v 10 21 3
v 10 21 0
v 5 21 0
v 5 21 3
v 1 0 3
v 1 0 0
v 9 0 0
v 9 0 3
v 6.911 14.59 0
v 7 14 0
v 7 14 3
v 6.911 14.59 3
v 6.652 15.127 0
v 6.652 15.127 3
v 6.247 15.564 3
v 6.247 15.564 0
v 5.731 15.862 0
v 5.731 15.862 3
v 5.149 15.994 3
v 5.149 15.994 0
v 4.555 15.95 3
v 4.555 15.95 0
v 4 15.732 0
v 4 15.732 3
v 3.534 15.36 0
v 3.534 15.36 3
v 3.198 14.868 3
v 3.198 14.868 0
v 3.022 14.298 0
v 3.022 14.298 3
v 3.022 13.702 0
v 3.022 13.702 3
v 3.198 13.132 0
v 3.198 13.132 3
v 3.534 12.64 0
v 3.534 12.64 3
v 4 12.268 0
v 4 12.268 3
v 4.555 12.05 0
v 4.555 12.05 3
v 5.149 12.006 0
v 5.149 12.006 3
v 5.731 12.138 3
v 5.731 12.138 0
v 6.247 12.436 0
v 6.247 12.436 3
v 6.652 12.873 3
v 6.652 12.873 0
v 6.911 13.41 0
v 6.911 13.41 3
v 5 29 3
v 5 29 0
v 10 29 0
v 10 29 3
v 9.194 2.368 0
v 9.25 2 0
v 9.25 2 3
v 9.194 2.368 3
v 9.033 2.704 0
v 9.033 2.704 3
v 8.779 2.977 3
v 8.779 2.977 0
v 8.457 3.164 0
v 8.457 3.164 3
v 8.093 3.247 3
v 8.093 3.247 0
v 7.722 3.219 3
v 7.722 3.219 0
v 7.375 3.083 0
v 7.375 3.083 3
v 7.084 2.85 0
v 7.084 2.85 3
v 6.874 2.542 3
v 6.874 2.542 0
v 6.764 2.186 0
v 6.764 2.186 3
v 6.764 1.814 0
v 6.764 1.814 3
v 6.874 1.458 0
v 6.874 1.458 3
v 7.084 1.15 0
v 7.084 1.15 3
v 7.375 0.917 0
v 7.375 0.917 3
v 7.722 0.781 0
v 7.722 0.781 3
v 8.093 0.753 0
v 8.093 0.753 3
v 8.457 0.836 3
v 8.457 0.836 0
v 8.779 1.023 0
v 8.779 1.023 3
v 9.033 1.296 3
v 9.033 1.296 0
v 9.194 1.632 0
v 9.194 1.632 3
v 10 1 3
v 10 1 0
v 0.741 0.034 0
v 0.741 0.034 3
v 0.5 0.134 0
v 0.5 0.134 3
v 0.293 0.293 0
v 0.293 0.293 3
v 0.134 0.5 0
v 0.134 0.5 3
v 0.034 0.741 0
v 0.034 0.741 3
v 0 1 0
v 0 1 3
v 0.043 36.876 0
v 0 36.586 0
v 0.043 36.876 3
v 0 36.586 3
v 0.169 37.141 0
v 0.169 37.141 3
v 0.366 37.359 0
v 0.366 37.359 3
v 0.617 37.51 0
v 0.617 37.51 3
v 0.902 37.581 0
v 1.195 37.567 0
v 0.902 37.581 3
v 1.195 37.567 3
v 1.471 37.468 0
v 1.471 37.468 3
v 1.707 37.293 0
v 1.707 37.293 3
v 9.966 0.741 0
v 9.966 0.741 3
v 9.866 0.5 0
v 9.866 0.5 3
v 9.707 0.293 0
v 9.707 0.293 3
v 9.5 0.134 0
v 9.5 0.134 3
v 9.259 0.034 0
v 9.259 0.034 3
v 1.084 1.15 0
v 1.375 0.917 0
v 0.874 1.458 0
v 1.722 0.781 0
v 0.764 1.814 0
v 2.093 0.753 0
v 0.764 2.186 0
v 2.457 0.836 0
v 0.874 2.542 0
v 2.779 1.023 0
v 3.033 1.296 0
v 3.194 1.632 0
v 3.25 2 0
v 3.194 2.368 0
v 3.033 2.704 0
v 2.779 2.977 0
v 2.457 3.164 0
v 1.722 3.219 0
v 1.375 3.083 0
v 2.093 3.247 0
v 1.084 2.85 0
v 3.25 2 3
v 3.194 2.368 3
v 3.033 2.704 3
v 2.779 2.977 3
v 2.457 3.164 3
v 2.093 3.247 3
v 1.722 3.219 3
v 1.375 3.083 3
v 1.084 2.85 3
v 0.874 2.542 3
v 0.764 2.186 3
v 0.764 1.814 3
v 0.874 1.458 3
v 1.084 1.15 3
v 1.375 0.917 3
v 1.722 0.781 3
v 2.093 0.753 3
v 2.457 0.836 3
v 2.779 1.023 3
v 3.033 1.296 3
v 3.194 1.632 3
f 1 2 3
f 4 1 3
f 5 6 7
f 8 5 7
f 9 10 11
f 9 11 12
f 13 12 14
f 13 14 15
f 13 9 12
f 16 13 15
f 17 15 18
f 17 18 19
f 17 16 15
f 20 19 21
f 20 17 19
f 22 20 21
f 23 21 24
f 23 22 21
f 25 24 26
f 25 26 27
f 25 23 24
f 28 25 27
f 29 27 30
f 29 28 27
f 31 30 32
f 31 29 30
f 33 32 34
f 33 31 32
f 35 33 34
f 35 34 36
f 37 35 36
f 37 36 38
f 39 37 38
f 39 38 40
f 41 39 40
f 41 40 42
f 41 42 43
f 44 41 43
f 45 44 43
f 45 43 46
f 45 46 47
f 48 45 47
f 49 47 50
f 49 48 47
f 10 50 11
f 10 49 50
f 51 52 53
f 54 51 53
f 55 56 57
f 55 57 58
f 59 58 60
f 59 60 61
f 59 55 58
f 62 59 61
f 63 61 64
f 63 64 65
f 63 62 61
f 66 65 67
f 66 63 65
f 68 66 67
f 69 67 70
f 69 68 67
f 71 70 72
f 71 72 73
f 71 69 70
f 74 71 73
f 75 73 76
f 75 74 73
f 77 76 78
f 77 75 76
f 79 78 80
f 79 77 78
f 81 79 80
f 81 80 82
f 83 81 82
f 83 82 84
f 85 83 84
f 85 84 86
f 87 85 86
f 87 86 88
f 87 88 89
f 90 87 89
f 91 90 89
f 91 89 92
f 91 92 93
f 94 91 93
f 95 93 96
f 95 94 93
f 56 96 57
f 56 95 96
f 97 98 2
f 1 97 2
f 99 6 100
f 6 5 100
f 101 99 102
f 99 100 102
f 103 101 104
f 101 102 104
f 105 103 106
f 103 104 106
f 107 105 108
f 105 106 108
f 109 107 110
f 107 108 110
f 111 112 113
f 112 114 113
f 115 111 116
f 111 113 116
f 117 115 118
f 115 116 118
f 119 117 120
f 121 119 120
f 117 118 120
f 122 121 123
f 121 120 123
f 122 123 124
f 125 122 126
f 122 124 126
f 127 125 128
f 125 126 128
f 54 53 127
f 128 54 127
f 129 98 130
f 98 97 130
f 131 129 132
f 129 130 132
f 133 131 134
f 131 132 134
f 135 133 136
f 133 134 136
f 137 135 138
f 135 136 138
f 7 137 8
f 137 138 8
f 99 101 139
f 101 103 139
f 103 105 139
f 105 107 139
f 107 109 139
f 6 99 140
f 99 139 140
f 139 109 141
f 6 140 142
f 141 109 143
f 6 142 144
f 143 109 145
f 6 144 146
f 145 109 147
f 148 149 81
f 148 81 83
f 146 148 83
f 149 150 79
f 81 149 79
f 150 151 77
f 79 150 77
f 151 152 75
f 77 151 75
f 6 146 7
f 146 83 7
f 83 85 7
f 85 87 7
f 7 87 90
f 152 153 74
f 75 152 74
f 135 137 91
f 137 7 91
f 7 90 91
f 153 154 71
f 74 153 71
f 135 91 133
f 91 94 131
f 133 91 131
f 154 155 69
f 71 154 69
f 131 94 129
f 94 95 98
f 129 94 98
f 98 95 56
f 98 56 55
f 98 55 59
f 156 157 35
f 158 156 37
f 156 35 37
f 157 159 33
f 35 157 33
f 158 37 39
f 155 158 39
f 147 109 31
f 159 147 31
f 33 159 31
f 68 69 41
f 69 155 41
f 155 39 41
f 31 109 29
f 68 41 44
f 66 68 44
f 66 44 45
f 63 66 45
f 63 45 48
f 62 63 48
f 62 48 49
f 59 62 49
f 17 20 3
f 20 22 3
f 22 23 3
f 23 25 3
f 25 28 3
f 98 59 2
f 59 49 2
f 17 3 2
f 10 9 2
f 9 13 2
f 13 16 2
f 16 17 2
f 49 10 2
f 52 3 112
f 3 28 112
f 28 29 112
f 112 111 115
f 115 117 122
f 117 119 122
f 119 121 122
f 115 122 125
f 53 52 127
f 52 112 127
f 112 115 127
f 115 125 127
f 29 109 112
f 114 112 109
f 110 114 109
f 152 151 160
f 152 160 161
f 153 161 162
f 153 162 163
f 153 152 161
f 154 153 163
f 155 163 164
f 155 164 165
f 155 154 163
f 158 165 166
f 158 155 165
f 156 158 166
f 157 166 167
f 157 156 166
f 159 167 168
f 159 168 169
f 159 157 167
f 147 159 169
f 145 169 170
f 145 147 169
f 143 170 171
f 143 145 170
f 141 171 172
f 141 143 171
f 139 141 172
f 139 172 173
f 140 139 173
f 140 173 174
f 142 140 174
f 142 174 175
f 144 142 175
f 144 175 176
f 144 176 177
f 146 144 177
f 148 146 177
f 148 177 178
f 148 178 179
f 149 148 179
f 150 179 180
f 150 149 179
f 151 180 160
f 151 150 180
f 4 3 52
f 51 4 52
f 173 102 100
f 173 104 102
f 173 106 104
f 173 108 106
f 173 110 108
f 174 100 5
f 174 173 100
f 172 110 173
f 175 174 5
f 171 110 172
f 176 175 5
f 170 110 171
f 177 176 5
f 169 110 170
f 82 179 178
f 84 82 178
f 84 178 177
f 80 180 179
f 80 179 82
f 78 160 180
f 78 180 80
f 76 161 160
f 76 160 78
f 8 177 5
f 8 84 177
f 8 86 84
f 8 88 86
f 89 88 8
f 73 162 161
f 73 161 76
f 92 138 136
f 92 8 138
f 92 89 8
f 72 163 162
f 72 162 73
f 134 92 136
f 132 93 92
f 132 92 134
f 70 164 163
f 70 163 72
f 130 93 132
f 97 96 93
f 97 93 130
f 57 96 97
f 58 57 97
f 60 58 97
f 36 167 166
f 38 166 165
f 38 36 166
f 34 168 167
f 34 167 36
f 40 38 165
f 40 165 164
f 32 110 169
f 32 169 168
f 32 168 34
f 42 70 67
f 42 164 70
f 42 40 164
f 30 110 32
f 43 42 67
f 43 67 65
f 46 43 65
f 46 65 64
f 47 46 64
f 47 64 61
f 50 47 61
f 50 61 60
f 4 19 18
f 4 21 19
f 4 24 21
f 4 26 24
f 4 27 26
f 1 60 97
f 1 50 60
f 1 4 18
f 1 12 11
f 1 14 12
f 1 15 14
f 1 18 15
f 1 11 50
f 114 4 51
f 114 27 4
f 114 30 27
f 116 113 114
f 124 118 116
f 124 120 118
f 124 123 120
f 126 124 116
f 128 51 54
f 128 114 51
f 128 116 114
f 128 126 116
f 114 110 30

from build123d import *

# Parameters (mm, degrees)
SKETCH_1_R      = 2
SKETCH_1_R_2    = 1.25
EXTRUDE_1_DEPTH = 3
FILLET_1_R      = 1


with BuildPart() as part:
    # 草图1 → 凸台-拉伸1 (new body)
    with BuildSketch(Plane.XY):
        Polygon((10, 0), (10, 21), (5, 21), (5, 29), (10, 29), (0, 39), (0, 0), align=None)
        with Locations((5, 14)):
            Circle(SKETCH_1_R, mode=Mode.SUBTRACT)
        with Locations((2, 2)):
            Circle(SKETCH_1_R_2, mode=Mode.SUBTRACT)
        with Locations((8, 2)):
            Circle(SKETCH_1_R_2, mode=Mode.SUBTRACT)
    extrude(amount=EXTRUDE_1_DEPTH)

    # 圆角1
    fillet_1_edges = [part.edges().sort_by_distance(p)[0] for p in [
        (0, 39, 1.5),
        (10, 0, 1.5),
        (0, 0, 1.5),
    ]]
    fillet(fillet_1_edges, radius=FILLET_1_R)


solid = part.part
